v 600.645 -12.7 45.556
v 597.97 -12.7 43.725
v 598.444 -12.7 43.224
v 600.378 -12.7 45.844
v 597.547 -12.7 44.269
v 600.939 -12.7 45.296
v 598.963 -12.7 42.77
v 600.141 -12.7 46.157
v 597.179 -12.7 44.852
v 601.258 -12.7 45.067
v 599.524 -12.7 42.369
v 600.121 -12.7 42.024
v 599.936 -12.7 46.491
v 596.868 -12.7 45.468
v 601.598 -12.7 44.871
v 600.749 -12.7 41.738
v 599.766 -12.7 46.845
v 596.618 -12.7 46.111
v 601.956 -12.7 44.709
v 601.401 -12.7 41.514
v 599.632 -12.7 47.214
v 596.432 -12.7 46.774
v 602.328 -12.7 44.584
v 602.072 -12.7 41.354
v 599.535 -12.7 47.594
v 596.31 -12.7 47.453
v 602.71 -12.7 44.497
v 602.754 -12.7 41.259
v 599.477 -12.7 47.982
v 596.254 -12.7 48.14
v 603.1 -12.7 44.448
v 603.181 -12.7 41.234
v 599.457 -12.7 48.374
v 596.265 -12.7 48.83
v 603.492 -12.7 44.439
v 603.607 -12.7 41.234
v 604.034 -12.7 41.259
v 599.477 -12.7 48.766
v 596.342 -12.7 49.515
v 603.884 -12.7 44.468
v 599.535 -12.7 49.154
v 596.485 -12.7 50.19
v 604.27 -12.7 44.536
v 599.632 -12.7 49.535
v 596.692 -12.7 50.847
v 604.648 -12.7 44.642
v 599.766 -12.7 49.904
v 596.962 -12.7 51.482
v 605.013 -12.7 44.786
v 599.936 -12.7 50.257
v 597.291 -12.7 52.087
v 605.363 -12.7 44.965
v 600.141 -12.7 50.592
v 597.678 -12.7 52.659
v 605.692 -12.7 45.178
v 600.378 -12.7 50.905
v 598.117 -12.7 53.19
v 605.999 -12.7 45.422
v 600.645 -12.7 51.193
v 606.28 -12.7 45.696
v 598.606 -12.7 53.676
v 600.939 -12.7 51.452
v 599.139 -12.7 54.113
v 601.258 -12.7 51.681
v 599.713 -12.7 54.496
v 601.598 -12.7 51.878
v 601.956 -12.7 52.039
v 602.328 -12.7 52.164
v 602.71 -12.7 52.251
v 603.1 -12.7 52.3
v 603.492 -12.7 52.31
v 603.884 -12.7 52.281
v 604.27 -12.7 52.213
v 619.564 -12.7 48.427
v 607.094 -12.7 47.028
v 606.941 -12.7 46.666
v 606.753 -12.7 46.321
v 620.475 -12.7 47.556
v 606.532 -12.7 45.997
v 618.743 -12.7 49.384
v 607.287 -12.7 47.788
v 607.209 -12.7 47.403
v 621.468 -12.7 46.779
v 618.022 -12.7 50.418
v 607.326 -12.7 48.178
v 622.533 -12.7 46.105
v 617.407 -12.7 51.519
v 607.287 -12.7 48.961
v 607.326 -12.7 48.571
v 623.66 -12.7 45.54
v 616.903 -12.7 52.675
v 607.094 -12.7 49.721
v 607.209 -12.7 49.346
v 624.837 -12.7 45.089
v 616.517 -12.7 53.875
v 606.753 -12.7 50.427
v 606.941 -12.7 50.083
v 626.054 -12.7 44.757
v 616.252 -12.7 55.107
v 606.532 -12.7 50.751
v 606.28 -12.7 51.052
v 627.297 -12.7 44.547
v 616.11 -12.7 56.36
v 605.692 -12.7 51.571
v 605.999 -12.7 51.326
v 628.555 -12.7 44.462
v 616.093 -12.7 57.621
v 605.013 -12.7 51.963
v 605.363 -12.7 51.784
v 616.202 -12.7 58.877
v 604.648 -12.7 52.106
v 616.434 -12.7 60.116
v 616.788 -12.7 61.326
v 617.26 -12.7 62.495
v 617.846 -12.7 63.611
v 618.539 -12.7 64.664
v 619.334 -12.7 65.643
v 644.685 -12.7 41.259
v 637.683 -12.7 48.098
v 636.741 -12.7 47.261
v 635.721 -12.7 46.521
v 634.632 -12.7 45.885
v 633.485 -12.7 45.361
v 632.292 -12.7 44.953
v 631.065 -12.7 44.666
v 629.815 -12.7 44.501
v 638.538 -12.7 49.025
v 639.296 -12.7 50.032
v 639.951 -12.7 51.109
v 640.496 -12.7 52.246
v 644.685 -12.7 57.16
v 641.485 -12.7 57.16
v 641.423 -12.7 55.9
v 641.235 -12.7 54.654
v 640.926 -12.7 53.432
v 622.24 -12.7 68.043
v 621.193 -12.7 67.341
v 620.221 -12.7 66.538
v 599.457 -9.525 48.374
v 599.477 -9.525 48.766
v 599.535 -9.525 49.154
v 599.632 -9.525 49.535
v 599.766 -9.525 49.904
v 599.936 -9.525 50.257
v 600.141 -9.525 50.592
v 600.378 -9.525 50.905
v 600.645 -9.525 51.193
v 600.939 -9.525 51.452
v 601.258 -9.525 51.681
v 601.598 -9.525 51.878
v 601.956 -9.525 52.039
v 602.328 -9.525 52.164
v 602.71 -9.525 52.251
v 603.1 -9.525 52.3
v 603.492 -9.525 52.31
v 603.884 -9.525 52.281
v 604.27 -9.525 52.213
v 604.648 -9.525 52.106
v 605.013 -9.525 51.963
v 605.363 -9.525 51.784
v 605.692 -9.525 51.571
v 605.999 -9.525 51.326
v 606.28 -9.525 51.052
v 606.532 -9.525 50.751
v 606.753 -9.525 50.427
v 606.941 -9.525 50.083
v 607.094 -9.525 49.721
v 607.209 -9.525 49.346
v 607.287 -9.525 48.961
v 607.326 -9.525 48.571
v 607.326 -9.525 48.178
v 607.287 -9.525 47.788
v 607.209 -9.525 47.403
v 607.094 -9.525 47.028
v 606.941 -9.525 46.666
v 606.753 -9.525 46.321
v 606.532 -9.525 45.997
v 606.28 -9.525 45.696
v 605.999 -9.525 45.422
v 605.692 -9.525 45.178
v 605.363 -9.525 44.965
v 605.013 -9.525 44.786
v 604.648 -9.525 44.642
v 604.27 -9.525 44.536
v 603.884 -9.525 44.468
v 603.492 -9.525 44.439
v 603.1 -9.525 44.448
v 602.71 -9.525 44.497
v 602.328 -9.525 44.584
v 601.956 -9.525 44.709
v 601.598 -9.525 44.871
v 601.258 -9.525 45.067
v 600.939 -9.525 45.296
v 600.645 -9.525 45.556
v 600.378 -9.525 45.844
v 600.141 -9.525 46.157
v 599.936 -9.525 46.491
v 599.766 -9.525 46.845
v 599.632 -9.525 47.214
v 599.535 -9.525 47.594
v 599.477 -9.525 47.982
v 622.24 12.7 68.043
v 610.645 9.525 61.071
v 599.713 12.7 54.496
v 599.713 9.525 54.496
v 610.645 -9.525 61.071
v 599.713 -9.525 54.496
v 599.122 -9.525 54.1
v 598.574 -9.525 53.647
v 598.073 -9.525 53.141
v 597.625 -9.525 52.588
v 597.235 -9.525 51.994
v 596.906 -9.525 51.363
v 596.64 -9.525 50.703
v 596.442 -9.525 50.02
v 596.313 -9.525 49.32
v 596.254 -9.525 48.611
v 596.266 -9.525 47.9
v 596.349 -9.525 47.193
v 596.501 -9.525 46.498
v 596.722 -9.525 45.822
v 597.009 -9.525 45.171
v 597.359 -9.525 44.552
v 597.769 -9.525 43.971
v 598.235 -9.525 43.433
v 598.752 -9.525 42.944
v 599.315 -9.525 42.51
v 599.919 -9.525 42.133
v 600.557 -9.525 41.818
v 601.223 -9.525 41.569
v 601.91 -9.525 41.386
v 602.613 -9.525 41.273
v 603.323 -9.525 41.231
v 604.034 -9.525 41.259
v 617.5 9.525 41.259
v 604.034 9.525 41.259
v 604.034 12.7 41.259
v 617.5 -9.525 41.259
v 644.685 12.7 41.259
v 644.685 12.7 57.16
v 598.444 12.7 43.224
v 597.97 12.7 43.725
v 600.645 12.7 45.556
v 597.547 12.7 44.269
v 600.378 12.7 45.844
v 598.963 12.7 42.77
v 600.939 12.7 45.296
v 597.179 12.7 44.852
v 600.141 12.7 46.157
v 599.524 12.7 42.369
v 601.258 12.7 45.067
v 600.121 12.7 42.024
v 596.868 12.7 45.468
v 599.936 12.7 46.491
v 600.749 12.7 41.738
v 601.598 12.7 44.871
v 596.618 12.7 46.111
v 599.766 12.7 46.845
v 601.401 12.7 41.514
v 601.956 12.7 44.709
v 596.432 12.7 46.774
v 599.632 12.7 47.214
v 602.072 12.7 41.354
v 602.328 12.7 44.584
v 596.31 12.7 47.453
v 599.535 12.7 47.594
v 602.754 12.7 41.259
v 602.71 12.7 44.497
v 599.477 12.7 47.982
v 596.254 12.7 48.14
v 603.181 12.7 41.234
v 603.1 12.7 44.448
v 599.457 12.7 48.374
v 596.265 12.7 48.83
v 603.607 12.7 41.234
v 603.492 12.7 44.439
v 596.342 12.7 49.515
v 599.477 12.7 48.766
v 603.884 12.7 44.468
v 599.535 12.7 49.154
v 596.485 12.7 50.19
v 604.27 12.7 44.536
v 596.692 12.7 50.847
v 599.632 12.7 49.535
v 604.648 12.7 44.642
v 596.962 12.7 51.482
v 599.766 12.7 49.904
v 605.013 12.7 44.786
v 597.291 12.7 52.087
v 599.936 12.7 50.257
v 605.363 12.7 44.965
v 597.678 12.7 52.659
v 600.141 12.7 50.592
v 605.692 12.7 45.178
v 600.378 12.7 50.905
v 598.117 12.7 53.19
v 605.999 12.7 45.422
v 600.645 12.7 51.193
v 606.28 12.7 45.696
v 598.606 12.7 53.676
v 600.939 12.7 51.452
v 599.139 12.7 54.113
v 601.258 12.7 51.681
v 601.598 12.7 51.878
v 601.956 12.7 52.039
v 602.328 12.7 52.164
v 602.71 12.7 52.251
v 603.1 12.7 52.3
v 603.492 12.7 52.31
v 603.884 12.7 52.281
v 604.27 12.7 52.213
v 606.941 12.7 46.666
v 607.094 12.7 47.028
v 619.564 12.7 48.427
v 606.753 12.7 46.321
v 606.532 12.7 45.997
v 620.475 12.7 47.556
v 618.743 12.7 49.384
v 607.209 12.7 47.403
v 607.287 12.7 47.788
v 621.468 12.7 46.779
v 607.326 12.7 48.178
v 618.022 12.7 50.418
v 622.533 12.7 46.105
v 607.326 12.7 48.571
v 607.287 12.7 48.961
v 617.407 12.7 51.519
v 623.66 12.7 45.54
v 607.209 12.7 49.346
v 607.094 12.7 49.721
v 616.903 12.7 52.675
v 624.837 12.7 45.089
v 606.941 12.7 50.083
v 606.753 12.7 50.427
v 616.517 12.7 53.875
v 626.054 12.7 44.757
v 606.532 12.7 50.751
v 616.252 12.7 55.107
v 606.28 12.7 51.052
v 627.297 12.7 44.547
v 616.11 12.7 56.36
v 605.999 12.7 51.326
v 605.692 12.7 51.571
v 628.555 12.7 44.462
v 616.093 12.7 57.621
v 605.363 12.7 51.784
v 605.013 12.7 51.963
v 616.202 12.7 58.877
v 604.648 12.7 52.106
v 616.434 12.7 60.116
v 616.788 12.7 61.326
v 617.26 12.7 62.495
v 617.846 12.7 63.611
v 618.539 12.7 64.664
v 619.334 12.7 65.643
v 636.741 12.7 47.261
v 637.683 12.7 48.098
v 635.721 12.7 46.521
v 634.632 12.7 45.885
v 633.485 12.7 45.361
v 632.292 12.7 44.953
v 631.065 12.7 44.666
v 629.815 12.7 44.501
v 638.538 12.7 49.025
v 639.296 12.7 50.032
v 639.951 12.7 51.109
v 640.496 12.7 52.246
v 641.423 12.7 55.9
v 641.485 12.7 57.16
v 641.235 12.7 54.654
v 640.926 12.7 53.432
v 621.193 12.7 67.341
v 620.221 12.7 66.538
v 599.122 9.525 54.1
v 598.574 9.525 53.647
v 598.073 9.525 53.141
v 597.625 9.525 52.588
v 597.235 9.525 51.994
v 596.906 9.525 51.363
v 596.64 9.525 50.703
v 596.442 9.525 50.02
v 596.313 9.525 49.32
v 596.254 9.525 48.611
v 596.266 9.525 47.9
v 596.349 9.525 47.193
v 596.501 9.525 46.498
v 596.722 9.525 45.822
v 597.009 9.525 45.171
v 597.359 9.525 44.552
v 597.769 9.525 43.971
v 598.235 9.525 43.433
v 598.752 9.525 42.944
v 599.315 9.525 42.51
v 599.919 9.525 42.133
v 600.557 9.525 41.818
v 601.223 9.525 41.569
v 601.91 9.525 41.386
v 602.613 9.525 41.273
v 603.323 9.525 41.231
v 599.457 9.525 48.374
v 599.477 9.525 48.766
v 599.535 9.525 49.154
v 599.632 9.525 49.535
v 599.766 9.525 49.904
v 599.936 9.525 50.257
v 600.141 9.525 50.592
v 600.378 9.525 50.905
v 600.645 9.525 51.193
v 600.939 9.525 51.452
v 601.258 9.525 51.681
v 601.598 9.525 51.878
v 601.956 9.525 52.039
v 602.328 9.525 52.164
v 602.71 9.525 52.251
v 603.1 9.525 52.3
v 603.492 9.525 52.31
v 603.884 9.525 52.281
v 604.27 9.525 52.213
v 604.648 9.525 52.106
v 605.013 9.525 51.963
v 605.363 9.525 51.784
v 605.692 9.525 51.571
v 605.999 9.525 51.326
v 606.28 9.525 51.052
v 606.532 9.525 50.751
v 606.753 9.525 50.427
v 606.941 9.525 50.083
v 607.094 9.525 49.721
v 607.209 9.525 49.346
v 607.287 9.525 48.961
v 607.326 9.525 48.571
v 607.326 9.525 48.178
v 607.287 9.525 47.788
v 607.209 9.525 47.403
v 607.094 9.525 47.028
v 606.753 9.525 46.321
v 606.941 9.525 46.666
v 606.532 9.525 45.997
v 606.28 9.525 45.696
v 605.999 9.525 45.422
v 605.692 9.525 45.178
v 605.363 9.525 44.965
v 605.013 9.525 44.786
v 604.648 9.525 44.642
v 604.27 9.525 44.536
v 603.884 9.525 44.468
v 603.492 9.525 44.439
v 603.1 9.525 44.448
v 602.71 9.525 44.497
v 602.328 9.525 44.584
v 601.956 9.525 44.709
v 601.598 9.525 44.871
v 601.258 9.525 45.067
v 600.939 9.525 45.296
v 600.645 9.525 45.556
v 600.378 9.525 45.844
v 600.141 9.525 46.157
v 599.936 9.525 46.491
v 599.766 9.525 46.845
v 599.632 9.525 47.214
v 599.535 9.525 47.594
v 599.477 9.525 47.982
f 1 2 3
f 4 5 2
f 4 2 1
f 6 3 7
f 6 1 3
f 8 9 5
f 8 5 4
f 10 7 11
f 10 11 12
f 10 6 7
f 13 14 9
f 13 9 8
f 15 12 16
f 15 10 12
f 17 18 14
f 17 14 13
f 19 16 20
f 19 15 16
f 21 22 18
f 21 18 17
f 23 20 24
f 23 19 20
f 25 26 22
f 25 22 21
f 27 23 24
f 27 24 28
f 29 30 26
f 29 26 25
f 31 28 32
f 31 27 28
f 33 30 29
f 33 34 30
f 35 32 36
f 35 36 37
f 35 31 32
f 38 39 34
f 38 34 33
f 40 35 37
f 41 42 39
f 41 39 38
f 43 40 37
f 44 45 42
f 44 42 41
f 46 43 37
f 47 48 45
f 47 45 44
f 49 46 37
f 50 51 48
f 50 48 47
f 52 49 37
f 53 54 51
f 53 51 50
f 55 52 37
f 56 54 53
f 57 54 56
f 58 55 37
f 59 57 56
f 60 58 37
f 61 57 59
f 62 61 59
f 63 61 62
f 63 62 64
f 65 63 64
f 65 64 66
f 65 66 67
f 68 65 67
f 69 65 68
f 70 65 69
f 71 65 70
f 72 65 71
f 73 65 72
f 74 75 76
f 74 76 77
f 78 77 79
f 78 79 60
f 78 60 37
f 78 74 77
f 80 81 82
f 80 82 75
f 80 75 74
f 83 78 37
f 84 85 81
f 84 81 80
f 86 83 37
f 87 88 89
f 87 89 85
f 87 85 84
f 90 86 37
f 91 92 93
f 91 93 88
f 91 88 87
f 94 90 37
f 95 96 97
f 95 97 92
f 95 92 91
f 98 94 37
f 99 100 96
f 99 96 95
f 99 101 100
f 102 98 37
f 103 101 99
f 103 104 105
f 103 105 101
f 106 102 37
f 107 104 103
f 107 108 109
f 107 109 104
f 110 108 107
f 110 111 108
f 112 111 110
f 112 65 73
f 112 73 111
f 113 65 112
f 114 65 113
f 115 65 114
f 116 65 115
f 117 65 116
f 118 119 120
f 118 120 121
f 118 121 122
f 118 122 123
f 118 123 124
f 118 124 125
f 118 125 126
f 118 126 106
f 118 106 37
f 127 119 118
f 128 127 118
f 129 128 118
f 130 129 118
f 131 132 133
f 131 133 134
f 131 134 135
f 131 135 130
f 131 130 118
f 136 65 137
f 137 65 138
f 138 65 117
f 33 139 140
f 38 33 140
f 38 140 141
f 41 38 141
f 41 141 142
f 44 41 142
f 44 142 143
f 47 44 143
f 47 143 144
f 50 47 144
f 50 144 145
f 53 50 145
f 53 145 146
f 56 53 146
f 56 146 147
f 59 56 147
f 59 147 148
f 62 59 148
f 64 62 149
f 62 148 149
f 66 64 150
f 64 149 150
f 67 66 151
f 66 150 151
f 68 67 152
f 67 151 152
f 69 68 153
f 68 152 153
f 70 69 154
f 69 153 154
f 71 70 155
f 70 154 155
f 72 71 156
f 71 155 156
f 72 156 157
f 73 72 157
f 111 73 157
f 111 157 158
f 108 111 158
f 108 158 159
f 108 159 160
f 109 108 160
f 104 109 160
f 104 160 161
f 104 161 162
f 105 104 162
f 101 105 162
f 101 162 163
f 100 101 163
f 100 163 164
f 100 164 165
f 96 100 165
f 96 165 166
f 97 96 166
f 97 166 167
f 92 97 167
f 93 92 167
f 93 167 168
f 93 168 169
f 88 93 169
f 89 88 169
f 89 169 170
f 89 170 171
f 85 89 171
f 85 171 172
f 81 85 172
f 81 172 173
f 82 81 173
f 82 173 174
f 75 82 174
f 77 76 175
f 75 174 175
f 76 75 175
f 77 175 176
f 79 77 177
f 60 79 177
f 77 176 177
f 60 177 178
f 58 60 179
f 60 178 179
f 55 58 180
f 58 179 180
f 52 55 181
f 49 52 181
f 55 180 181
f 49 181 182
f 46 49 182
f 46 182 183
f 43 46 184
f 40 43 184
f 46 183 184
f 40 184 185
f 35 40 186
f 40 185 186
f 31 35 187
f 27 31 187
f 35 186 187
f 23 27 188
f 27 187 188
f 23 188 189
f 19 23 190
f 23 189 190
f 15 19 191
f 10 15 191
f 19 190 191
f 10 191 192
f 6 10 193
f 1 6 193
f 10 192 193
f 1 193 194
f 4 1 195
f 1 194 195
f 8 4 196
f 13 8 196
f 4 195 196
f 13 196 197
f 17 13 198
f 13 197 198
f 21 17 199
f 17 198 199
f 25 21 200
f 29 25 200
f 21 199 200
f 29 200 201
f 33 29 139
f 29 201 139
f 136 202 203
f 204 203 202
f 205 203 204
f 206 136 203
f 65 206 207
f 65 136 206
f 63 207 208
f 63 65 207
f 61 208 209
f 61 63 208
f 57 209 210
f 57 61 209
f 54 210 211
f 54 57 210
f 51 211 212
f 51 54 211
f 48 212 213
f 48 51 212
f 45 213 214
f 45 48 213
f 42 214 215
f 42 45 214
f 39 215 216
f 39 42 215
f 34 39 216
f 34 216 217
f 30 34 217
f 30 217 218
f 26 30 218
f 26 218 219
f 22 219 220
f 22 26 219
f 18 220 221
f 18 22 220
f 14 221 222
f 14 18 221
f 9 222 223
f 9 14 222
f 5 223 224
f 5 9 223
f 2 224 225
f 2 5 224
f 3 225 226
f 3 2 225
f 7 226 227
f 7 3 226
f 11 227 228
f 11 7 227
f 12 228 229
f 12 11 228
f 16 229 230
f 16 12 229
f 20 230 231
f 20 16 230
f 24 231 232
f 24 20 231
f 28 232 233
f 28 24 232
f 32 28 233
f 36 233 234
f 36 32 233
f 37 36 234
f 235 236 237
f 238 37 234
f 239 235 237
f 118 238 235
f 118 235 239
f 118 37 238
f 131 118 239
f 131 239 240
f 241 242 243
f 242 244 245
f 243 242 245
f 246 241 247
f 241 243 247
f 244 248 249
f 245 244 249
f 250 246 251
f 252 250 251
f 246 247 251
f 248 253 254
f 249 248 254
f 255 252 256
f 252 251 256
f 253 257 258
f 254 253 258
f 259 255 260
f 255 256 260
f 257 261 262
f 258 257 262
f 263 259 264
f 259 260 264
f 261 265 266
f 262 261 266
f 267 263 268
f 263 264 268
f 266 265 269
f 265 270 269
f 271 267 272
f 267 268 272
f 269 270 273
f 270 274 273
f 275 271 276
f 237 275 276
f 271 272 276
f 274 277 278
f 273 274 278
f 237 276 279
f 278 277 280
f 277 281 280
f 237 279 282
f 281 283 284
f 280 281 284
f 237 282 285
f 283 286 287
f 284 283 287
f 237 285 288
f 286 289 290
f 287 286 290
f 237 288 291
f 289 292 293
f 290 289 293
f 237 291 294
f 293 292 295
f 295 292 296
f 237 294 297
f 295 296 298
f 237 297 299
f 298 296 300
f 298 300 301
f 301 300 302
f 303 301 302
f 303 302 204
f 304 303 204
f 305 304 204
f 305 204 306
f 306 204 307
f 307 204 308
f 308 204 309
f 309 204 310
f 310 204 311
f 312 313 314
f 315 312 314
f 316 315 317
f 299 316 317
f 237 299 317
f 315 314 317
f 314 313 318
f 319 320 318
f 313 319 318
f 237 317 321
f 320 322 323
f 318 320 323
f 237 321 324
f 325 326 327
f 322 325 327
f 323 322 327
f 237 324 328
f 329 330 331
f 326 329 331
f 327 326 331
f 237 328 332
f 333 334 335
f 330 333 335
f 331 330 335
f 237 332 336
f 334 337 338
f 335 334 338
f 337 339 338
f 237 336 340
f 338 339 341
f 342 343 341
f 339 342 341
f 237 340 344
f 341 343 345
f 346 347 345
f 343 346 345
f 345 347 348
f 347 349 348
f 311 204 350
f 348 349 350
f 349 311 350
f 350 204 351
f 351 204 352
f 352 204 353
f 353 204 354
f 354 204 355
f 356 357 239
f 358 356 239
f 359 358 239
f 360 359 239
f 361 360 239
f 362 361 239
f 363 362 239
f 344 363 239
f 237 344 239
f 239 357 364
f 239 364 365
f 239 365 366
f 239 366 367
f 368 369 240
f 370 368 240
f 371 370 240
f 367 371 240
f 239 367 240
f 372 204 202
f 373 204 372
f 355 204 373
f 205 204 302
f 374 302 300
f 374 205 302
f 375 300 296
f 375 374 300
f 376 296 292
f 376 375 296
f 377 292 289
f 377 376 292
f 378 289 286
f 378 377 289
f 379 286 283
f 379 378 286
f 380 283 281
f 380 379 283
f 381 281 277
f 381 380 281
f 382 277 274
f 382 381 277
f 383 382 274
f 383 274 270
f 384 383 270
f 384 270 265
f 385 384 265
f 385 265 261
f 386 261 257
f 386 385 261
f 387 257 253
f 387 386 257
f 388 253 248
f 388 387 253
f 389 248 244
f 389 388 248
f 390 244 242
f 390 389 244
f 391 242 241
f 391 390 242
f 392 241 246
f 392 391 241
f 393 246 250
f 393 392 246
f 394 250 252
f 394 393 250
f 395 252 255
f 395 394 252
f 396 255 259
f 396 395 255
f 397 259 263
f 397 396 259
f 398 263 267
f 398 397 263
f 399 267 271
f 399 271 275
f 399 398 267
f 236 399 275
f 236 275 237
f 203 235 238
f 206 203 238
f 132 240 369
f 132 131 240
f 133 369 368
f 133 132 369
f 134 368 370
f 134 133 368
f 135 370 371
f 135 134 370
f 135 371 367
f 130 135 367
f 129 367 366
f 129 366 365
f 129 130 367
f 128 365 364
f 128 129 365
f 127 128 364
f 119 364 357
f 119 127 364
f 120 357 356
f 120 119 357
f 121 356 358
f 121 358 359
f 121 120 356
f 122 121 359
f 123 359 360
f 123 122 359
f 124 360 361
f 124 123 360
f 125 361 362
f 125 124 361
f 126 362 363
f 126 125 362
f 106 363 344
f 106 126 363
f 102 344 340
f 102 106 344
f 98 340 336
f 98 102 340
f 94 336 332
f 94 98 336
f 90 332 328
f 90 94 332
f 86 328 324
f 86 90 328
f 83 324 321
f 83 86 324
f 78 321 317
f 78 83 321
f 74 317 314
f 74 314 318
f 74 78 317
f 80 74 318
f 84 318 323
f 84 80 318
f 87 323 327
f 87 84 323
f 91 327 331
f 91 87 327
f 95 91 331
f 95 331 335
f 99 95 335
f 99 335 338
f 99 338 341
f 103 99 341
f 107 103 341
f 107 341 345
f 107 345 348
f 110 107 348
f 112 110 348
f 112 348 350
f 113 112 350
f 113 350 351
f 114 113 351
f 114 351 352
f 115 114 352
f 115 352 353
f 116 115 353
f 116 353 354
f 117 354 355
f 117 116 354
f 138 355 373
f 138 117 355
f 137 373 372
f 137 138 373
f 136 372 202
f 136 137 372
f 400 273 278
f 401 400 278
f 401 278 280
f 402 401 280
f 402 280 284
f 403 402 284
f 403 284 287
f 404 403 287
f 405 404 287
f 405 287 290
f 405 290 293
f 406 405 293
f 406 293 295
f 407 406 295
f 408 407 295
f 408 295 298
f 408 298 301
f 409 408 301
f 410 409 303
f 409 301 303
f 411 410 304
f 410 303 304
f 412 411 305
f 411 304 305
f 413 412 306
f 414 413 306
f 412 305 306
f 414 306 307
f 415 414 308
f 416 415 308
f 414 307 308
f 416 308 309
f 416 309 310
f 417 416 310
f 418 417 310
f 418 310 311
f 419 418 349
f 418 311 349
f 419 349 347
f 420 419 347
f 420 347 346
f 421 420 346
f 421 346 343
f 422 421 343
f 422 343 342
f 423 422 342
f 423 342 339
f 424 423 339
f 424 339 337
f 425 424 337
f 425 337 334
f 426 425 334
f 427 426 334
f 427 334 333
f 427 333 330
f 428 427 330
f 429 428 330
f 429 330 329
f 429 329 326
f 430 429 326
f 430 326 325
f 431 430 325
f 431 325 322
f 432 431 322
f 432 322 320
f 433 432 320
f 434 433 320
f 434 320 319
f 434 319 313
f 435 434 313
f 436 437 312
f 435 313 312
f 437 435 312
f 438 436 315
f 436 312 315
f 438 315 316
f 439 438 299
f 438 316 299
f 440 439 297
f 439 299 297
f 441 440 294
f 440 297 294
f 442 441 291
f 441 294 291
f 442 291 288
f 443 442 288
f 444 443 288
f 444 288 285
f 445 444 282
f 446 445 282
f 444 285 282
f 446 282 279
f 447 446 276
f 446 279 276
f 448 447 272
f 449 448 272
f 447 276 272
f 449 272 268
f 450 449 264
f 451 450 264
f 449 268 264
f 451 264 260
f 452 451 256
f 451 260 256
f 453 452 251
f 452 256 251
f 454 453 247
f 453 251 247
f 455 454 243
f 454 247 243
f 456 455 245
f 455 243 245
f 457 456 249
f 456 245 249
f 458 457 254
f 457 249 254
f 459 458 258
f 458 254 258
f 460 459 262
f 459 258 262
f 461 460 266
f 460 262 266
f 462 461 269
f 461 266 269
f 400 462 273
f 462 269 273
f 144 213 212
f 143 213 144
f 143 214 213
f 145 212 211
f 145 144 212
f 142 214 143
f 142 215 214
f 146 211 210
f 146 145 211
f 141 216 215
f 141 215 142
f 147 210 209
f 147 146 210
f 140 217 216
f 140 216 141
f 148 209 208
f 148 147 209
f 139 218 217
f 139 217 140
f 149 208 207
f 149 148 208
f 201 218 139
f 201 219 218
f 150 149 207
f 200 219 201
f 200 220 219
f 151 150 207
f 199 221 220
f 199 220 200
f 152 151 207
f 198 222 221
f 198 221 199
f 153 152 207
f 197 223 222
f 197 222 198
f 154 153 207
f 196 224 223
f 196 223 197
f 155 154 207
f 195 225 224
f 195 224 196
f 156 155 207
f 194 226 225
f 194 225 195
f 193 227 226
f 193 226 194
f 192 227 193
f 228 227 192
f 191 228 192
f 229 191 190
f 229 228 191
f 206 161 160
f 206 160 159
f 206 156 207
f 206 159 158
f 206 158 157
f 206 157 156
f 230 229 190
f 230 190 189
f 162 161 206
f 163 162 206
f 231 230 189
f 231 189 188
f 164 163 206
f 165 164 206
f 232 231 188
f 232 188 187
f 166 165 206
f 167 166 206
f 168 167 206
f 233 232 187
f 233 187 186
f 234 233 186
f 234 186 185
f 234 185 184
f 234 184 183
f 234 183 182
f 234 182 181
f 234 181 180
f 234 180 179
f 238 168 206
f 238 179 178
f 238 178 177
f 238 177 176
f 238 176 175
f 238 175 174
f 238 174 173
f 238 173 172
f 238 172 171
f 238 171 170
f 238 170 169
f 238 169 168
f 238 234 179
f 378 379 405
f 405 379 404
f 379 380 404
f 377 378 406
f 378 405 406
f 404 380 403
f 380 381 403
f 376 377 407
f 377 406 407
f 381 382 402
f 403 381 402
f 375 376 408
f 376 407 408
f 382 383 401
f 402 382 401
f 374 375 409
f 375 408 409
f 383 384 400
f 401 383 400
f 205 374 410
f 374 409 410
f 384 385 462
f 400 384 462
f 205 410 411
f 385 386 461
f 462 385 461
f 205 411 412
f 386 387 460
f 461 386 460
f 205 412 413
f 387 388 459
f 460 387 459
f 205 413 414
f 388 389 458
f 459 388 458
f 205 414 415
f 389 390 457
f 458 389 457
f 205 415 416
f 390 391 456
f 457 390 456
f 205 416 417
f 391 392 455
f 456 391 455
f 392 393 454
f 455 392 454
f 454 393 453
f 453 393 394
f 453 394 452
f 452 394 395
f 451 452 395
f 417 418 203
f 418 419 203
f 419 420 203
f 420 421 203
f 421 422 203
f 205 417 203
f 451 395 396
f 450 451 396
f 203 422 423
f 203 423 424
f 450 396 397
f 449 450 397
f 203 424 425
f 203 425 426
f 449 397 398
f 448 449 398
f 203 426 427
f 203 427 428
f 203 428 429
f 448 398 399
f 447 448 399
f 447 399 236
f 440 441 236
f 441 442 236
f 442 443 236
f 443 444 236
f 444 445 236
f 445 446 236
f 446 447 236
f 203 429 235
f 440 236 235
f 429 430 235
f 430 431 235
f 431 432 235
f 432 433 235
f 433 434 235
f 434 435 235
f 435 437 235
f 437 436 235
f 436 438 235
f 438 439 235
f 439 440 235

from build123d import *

# Parameters (mm, degrees)
F1_DEPTH      = 12.7
F1_DEPTH_BACK = 12.7
F2_R          = 3.937
F3_DEPTH      = 25.401
F5_W          = 25.4239097328
F5_H          = 19.05
F6_DEPTH      = 20.9247035883
F6_DEPTH_BACK = 20.2536193136


with BuildPart() as f1:
    # F0 (on Front) → F1 (new body, two sides)
    with BuildSketch(Plane.XZ) as f1_sk:
        with BuildLine():
            Line((622.2402070197, 68.0433236969), (599.7125589726, 54.4963749958))
            ThreePointArc((599.7125589726, 54.4963749958), (596.4317742001, 46.7743526151), (602.7544880205, 41.259239895))
            Line((602.7544880205, 41.259239895), (604.0336175771, 41.259239895))
            Line((604.0336175771, 41.259239895), (628.785084933, 41.259239895))
            Line((628.785084933, 41.259239895), (644.685484933, 41.259239895))
            Line((644.685484933, 41.259239895), (644.685484933, 57.159639895))
            Line((644.685484933, 57.159639895), (641.485084933, 57.159639895))
            ThreePointArc((641.485084933, 57.159639895), (622.5332831727, 46.1050040009), (622.2402070197, 68.0433236969))
        make_face()
        with BuildLine():
            Line((604.0336175771, 41.259239895), (602.7544880205, 41.259239895))
            ThreePointArc((602.7544880205, 41.259239895), (603.3940527988, 41.2305528572), (604.0336175771, 41.259239895))
        make_face()
    extrude(amount=F1_DEPTH)
    extrude(f1_sk.sketch, amount=-F1_DEPTH_BACK)

    # F2 (on face) → F3 (cut, through all)
    with BuildSketch(Plane(origin=(0, 12.7, 0), x_dir=(-1, 0, 0), z_dir=(0, 1, 0))):
        with Locations((-603.3940527988, 48.3743028572)):
            Circle(F2_R)
    extrude(amount=-F3_DEPTH, mode=Mode.SUBTRACT)

    # F5 (on face) → F6 (cut, two sides)
    with BuildSketch(Plane(origin=(49.5651934259, 0, -143.2513532049), x_dir=(0.9450305474, 0, 0.3269820552), z_dir=(0.3269820552, 0, -0.9450305474))) as f6_sk:
        with Locations((584.3355135098, 0)):
            Rectangle(F5_W, F5_H)
    extrude(amount=-F6_DEPTH, mode=Mode.SUBTRACT)
    extrude(f6_sk.sketch, amount=F6_DEPTH_BACK, mode=Mode.SUBTRACT)


solid = f1.part
